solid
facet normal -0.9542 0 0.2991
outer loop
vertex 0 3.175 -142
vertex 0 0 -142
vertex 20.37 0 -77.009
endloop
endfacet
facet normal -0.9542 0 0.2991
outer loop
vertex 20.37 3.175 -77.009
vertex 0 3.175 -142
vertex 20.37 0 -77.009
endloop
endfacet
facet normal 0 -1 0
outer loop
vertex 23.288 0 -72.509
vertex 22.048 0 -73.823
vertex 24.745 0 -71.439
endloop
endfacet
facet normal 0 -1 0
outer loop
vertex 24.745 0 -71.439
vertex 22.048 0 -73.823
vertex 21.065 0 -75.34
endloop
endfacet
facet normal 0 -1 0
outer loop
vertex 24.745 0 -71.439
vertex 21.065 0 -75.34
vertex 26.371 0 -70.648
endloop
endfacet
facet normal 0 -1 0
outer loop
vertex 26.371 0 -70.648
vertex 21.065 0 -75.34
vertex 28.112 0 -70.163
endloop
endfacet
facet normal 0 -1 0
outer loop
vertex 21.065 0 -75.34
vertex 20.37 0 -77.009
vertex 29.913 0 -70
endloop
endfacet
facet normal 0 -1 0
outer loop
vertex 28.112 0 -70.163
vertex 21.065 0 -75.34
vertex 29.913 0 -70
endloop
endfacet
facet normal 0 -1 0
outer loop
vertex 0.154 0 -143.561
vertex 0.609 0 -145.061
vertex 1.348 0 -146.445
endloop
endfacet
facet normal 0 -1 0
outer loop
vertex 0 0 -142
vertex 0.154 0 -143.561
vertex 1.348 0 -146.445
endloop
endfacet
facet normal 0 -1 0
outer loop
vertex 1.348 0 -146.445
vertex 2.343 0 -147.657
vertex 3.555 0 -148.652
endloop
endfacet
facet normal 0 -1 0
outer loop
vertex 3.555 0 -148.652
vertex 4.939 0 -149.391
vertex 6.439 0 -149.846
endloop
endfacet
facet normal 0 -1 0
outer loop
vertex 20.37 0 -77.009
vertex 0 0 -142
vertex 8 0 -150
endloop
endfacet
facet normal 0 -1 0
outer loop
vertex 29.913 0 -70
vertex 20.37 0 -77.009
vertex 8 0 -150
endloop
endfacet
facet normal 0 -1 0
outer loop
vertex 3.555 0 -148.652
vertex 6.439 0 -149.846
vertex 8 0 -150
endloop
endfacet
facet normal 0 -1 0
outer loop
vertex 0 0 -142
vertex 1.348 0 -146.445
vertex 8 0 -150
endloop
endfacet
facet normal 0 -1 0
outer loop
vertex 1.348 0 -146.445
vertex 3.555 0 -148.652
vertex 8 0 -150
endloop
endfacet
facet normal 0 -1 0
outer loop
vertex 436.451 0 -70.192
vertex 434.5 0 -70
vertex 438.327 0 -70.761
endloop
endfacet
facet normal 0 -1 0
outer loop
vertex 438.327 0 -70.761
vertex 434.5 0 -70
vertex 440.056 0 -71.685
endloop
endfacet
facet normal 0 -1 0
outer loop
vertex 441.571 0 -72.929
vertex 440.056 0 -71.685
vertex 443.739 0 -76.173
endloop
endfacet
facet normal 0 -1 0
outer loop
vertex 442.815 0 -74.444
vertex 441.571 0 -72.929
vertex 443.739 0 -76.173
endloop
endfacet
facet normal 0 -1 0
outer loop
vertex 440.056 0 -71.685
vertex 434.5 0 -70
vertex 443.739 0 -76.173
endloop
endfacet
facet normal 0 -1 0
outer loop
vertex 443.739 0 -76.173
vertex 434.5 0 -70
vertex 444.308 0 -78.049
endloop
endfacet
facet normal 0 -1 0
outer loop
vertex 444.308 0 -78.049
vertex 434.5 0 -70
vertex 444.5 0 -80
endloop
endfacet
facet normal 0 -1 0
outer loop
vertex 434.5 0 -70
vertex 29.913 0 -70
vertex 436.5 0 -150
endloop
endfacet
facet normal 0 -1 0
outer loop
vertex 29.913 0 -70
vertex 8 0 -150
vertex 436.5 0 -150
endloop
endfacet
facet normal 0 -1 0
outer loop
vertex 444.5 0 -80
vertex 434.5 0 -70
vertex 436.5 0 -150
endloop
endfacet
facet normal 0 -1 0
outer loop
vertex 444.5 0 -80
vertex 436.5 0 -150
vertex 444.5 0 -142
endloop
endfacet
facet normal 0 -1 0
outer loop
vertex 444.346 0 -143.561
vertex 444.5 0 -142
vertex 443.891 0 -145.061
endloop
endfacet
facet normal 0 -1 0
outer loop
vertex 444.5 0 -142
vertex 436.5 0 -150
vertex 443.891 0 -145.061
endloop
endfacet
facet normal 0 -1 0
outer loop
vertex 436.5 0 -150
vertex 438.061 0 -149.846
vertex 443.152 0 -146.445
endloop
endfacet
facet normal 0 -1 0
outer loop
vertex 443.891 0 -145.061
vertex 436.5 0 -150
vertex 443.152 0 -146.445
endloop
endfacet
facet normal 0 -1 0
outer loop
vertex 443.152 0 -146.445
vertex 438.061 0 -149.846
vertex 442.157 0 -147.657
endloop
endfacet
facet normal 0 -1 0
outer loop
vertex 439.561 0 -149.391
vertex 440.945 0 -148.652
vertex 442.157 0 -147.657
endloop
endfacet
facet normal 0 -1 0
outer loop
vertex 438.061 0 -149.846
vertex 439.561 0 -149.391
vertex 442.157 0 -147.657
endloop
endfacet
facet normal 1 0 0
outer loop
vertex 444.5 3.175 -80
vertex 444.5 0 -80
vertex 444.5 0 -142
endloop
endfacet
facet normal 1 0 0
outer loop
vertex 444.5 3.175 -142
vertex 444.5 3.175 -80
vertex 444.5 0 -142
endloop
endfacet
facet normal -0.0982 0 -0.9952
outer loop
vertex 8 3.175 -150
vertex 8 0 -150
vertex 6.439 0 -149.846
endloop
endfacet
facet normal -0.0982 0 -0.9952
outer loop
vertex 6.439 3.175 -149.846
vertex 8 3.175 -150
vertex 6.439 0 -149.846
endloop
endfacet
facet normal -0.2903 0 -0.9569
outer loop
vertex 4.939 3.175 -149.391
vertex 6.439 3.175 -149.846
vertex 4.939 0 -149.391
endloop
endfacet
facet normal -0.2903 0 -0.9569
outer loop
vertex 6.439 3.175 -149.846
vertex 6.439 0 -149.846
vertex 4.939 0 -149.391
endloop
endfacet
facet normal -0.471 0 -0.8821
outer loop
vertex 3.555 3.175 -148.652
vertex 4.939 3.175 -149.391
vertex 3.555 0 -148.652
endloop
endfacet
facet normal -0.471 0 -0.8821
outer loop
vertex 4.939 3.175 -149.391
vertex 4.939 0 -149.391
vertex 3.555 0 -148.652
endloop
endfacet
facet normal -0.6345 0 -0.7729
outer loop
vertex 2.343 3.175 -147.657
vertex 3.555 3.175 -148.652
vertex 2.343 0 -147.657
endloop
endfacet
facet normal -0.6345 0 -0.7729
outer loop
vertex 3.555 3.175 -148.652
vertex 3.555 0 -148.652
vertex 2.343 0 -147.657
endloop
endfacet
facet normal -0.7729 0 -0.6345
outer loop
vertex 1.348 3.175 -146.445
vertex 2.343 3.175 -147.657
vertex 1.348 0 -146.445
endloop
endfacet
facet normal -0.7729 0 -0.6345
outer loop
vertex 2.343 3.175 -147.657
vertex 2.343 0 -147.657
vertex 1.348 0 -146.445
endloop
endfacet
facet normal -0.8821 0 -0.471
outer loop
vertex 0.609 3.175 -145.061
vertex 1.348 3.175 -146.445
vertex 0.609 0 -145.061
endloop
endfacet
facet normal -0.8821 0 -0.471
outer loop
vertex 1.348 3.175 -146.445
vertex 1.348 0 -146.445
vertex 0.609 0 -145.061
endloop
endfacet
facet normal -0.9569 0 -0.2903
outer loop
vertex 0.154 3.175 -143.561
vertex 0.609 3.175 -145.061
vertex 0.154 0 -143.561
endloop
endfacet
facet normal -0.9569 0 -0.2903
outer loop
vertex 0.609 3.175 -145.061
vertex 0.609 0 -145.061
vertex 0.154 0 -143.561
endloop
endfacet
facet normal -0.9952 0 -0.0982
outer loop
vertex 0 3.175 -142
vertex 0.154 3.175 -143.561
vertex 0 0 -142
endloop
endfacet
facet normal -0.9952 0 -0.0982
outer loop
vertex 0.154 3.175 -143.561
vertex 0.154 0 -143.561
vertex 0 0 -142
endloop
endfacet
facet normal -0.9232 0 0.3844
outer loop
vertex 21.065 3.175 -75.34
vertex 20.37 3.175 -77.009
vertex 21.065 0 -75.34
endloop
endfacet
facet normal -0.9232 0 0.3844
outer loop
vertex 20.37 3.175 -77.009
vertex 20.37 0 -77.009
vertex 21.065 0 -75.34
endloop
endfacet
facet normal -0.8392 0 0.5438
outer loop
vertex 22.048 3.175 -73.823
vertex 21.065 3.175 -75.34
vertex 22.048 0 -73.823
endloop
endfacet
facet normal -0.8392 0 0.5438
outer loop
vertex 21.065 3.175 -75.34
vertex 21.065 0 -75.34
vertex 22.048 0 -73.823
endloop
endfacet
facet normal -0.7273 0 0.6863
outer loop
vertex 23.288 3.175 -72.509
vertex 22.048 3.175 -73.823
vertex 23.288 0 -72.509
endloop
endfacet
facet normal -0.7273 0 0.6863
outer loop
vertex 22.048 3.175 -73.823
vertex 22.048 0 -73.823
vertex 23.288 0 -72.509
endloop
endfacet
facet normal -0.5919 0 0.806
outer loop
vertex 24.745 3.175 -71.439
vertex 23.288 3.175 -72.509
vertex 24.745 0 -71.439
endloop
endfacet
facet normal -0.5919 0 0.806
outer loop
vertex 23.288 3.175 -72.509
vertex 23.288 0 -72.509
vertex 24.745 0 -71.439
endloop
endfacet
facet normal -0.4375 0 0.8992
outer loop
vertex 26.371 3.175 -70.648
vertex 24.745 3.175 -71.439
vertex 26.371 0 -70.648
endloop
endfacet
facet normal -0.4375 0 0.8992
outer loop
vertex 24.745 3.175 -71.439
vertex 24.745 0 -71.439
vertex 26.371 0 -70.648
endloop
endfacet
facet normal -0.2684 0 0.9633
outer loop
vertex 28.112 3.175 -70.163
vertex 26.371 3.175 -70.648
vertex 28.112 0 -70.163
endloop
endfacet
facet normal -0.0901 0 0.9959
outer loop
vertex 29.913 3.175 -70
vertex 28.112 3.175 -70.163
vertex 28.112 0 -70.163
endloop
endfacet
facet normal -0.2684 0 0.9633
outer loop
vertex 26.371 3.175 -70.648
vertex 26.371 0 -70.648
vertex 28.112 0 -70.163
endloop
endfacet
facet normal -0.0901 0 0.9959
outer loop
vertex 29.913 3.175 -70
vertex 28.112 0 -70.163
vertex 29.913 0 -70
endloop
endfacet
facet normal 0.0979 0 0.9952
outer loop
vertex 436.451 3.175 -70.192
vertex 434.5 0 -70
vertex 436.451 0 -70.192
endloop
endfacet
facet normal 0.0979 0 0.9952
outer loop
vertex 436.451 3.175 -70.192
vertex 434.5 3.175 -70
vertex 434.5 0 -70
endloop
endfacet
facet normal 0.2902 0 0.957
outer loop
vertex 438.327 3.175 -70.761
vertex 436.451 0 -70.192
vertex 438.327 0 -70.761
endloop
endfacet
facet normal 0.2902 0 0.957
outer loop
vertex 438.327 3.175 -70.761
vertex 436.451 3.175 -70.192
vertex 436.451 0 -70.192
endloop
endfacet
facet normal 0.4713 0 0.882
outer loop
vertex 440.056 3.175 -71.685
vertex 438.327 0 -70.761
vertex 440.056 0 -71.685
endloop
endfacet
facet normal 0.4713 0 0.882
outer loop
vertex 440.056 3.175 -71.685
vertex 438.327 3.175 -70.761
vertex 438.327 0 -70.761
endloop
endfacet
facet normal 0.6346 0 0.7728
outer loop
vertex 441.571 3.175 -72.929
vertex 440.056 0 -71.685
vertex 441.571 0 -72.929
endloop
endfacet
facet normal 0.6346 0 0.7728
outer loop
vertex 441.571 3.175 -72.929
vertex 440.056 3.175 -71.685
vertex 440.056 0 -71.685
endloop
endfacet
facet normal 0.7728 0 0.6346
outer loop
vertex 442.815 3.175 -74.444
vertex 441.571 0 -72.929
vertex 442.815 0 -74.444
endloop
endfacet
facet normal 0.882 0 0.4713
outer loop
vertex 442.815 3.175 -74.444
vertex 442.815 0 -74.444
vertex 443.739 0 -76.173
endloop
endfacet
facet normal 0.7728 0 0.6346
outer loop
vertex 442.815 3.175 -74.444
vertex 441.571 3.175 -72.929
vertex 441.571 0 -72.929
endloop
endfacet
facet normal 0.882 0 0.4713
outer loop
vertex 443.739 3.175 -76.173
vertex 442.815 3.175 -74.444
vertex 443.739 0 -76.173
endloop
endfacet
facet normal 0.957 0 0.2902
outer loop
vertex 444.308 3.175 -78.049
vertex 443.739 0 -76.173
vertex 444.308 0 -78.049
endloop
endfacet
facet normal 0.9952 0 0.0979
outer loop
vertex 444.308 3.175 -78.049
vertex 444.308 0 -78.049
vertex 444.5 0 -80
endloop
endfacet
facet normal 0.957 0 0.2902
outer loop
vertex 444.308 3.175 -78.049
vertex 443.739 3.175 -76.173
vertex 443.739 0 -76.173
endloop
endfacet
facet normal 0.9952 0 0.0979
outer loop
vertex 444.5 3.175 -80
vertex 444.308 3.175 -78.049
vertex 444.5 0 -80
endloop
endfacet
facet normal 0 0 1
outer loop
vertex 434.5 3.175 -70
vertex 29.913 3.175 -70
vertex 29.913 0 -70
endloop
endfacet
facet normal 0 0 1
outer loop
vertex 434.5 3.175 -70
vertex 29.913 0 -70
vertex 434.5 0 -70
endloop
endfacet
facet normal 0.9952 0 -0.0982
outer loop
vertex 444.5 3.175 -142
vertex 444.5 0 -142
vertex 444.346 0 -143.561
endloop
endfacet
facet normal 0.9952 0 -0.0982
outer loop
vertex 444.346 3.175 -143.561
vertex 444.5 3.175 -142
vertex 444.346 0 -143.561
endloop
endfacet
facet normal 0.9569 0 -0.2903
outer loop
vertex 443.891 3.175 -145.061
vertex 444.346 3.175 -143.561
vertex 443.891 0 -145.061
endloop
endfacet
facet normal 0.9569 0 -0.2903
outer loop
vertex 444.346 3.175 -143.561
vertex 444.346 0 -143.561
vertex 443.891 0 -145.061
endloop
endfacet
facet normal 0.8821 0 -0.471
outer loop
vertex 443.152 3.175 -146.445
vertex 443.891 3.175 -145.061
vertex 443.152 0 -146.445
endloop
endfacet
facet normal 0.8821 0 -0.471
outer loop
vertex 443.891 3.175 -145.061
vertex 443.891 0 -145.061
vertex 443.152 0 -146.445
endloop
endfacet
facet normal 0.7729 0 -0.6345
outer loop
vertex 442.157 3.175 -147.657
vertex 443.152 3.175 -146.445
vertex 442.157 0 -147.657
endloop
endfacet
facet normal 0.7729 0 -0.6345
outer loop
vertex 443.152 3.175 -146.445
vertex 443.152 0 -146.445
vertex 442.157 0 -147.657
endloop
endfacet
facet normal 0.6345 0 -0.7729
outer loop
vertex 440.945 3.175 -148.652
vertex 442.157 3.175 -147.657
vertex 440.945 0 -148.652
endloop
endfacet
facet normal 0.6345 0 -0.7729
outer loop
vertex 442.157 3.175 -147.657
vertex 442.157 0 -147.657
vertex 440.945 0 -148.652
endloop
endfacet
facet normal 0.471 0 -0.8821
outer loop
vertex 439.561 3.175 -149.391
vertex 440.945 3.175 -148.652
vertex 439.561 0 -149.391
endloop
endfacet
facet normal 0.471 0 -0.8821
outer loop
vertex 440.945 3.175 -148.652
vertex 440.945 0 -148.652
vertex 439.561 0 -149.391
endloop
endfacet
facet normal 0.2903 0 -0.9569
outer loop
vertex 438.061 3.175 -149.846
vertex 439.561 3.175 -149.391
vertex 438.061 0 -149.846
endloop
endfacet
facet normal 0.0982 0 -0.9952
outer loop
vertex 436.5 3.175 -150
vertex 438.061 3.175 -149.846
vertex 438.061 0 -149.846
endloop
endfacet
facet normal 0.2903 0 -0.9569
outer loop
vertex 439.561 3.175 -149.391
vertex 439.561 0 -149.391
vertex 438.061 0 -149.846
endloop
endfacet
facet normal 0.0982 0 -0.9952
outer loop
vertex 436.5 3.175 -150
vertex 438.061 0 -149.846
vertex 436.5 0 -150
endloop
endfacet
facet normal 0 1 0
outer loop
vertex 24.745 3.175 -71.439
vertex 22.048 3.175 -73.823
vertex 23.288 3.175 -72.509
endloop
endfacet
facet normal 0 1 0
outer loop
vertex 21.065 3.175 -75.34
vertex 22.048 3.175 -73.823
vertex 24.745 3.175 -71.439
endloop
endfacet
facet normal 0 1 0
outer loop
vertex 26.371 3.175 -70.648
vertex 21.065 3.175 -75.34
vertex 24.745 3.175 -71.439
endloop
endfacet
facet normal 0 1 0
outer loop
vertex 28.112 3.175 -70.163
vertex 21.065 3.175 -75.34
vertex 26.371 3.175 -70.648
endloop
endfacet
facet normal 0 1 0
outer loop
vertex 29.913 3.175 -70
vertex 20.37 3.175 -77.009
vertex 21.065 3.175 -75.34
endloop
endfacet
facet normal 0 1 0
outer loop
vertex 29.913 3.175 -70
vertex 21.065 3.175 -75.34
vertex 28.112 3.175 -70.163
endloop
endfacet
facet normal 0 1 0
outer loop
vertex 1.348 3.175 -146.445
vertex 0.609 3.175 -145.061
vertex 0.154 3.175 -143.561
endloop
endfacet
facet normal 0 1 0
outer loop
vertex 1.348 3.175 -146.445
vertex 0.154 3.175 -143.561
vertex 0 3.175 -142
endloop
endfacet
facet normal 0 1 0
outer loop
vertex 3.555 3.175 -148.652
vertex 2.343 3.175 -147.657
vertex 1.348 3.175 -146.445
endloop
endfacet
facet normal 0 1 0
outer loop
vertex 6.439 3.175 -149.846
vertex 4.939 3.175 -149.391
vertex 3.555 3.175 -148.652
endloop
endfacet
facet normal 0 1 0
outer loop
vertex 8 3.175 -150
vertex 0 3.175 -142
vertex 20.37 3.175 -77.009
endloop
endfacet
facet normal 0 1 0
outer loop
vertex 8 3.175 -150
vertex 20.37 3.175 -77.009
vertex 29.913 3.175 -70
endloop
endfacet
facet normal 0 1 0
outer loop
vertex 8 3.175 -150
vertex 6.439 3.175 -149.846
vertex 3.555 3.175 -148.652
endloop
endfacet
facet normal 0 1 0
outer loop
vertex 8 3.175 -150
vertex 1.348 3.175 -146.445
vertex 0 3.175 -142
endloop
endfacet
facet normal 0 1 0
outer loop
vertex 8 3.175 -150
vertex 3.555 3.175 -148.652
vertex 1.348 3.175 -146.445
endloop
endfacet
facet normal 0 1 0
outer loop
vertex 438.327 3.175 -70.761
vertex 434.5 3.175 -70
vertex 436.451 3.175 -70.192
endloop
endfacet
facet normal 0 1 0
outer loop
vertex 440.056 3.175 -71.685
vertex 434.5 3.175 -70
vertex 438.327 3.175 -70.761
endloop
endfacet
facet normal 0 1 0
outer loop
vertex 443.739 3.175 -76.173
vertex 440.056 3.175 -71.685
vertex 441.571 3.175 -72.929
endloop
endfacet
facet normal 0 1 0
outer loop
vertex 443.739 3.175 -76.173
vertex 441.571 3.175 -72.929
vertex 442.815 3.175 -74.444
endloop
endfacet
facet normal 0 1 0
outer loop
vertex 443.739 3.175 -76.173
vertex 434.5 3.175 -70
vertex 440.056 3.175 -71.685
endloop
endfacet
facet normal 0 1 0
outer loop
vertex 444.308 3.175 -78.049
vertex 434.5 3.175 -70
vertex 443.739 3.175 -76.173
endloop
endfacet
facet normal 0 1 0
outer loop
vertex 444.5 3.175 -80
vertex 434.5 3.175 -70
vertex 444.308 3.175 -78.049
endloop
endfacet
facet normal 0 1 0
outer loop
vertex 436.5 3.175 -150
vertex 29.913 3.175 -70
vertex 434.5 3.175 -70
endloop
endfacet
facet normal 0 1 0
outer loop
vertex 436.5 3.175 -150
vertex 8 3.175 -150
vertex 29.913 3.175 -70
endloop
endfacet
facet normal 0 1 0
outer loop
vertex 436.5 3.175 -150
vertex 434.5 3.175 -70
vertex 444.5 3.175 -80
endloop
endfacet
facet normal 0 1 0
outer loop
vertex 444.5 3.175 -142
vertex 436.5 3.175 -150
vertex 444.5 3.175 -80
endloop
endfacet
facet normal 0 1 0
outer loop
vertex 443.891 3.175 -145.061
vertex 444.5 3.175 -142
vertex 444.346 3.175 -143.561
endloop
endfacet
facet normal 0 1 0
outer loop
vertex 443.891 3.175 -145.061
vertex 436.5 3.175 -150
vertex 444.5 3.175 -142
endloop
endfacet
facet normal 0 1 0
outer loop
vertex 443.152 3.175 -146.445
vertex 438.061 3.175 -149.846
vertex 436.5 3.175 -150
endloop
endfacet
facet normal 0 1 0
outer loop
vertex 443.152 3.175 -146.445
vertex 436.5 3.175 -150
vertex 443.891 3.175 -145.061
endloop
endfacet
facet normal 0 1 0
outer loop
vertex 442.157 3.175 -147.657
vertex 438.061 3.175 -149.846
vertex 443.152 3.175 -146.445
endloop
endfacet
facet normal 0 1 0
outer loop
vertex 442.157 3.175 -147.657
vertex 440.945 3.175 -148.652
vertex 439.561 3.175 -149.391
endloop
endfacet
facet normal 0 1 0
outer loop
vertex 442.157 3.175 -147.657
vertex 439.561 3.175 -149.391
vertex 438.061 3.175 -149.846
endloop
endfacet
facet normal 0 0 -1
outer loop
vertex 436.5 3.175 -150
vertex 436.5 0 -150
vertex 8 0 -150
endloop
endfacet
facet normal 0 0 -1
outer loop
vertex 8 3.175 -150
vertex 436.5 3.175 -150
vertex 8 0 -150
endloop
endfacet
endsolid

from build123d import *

# Parameters (mm, degrees)
BOSS_EXTRUDE1_DEPTH = 3.175
SKETCH2_W           = 597.466303312
SKETCH2_H           = 60.972543052
CUT_EXTRUDE1_DEPTH  = 70
FILLET1_R           = 10
FILLET2_R           = 10


with BuildPart() as part:
    # Sketch1 → Boss-Extrude1 (new body)
    with BuildSketch(Plane(origin=(0, 0, 0), x_dir=(1, 0, 0), z_dir=(0, 1, 0))):
        with BuildLine():
            ThreePointArc((8, 150), (2.343145751, 147.656854249), (0, 142))
            Line((0, 142), (42, 8))
            ThreePointArc((42, 8), (44.343145751, 2.343145751), (50, 0))
            Line((50, 0), (436.5, 0))
            ThreePointArc((436.5, 0), (442.156854249, 2.343145751), (444.5, 8))
            Line((444.5, 8), (444.5, 142))
            ThreePointArc((444.5, 142), (442.156854249, 147.656854249), (436.5, 150))
            Line((436.5, 150), (8, 150))
        make_face()
    extrude(amount=BOSS_EXTRUDE1_DEPTH)

    # Sketch2 → Cut-Extrude1 (cut)
    with BuildSketch(Plane.XY):
        with Locations((220.1785332, 7.544358636)):
            Rectangle(SKETCH2_W, SKETCH2_H)
    extrude(amount=-CUT_EXTRUDE1_DEPTH, mode=Mode.SUBTRACT)

    # Fillet1
    fillet1_edges = [part.edges().sort_by_distance(p)[0] for p in [
        (22.567164179, 1.5875, -70),
    ]]
    fillet(fillet1_edges, radius=FILLET1_R)

    # Fillet2
    fillet2_edges = [part.edges().sort_by_distance(p)[0] for p in [
        (444.5, 1.5875, -70),
    ]]
    fillet(fillet2_edges, radius=FILLET2_R)


solid = part.part
